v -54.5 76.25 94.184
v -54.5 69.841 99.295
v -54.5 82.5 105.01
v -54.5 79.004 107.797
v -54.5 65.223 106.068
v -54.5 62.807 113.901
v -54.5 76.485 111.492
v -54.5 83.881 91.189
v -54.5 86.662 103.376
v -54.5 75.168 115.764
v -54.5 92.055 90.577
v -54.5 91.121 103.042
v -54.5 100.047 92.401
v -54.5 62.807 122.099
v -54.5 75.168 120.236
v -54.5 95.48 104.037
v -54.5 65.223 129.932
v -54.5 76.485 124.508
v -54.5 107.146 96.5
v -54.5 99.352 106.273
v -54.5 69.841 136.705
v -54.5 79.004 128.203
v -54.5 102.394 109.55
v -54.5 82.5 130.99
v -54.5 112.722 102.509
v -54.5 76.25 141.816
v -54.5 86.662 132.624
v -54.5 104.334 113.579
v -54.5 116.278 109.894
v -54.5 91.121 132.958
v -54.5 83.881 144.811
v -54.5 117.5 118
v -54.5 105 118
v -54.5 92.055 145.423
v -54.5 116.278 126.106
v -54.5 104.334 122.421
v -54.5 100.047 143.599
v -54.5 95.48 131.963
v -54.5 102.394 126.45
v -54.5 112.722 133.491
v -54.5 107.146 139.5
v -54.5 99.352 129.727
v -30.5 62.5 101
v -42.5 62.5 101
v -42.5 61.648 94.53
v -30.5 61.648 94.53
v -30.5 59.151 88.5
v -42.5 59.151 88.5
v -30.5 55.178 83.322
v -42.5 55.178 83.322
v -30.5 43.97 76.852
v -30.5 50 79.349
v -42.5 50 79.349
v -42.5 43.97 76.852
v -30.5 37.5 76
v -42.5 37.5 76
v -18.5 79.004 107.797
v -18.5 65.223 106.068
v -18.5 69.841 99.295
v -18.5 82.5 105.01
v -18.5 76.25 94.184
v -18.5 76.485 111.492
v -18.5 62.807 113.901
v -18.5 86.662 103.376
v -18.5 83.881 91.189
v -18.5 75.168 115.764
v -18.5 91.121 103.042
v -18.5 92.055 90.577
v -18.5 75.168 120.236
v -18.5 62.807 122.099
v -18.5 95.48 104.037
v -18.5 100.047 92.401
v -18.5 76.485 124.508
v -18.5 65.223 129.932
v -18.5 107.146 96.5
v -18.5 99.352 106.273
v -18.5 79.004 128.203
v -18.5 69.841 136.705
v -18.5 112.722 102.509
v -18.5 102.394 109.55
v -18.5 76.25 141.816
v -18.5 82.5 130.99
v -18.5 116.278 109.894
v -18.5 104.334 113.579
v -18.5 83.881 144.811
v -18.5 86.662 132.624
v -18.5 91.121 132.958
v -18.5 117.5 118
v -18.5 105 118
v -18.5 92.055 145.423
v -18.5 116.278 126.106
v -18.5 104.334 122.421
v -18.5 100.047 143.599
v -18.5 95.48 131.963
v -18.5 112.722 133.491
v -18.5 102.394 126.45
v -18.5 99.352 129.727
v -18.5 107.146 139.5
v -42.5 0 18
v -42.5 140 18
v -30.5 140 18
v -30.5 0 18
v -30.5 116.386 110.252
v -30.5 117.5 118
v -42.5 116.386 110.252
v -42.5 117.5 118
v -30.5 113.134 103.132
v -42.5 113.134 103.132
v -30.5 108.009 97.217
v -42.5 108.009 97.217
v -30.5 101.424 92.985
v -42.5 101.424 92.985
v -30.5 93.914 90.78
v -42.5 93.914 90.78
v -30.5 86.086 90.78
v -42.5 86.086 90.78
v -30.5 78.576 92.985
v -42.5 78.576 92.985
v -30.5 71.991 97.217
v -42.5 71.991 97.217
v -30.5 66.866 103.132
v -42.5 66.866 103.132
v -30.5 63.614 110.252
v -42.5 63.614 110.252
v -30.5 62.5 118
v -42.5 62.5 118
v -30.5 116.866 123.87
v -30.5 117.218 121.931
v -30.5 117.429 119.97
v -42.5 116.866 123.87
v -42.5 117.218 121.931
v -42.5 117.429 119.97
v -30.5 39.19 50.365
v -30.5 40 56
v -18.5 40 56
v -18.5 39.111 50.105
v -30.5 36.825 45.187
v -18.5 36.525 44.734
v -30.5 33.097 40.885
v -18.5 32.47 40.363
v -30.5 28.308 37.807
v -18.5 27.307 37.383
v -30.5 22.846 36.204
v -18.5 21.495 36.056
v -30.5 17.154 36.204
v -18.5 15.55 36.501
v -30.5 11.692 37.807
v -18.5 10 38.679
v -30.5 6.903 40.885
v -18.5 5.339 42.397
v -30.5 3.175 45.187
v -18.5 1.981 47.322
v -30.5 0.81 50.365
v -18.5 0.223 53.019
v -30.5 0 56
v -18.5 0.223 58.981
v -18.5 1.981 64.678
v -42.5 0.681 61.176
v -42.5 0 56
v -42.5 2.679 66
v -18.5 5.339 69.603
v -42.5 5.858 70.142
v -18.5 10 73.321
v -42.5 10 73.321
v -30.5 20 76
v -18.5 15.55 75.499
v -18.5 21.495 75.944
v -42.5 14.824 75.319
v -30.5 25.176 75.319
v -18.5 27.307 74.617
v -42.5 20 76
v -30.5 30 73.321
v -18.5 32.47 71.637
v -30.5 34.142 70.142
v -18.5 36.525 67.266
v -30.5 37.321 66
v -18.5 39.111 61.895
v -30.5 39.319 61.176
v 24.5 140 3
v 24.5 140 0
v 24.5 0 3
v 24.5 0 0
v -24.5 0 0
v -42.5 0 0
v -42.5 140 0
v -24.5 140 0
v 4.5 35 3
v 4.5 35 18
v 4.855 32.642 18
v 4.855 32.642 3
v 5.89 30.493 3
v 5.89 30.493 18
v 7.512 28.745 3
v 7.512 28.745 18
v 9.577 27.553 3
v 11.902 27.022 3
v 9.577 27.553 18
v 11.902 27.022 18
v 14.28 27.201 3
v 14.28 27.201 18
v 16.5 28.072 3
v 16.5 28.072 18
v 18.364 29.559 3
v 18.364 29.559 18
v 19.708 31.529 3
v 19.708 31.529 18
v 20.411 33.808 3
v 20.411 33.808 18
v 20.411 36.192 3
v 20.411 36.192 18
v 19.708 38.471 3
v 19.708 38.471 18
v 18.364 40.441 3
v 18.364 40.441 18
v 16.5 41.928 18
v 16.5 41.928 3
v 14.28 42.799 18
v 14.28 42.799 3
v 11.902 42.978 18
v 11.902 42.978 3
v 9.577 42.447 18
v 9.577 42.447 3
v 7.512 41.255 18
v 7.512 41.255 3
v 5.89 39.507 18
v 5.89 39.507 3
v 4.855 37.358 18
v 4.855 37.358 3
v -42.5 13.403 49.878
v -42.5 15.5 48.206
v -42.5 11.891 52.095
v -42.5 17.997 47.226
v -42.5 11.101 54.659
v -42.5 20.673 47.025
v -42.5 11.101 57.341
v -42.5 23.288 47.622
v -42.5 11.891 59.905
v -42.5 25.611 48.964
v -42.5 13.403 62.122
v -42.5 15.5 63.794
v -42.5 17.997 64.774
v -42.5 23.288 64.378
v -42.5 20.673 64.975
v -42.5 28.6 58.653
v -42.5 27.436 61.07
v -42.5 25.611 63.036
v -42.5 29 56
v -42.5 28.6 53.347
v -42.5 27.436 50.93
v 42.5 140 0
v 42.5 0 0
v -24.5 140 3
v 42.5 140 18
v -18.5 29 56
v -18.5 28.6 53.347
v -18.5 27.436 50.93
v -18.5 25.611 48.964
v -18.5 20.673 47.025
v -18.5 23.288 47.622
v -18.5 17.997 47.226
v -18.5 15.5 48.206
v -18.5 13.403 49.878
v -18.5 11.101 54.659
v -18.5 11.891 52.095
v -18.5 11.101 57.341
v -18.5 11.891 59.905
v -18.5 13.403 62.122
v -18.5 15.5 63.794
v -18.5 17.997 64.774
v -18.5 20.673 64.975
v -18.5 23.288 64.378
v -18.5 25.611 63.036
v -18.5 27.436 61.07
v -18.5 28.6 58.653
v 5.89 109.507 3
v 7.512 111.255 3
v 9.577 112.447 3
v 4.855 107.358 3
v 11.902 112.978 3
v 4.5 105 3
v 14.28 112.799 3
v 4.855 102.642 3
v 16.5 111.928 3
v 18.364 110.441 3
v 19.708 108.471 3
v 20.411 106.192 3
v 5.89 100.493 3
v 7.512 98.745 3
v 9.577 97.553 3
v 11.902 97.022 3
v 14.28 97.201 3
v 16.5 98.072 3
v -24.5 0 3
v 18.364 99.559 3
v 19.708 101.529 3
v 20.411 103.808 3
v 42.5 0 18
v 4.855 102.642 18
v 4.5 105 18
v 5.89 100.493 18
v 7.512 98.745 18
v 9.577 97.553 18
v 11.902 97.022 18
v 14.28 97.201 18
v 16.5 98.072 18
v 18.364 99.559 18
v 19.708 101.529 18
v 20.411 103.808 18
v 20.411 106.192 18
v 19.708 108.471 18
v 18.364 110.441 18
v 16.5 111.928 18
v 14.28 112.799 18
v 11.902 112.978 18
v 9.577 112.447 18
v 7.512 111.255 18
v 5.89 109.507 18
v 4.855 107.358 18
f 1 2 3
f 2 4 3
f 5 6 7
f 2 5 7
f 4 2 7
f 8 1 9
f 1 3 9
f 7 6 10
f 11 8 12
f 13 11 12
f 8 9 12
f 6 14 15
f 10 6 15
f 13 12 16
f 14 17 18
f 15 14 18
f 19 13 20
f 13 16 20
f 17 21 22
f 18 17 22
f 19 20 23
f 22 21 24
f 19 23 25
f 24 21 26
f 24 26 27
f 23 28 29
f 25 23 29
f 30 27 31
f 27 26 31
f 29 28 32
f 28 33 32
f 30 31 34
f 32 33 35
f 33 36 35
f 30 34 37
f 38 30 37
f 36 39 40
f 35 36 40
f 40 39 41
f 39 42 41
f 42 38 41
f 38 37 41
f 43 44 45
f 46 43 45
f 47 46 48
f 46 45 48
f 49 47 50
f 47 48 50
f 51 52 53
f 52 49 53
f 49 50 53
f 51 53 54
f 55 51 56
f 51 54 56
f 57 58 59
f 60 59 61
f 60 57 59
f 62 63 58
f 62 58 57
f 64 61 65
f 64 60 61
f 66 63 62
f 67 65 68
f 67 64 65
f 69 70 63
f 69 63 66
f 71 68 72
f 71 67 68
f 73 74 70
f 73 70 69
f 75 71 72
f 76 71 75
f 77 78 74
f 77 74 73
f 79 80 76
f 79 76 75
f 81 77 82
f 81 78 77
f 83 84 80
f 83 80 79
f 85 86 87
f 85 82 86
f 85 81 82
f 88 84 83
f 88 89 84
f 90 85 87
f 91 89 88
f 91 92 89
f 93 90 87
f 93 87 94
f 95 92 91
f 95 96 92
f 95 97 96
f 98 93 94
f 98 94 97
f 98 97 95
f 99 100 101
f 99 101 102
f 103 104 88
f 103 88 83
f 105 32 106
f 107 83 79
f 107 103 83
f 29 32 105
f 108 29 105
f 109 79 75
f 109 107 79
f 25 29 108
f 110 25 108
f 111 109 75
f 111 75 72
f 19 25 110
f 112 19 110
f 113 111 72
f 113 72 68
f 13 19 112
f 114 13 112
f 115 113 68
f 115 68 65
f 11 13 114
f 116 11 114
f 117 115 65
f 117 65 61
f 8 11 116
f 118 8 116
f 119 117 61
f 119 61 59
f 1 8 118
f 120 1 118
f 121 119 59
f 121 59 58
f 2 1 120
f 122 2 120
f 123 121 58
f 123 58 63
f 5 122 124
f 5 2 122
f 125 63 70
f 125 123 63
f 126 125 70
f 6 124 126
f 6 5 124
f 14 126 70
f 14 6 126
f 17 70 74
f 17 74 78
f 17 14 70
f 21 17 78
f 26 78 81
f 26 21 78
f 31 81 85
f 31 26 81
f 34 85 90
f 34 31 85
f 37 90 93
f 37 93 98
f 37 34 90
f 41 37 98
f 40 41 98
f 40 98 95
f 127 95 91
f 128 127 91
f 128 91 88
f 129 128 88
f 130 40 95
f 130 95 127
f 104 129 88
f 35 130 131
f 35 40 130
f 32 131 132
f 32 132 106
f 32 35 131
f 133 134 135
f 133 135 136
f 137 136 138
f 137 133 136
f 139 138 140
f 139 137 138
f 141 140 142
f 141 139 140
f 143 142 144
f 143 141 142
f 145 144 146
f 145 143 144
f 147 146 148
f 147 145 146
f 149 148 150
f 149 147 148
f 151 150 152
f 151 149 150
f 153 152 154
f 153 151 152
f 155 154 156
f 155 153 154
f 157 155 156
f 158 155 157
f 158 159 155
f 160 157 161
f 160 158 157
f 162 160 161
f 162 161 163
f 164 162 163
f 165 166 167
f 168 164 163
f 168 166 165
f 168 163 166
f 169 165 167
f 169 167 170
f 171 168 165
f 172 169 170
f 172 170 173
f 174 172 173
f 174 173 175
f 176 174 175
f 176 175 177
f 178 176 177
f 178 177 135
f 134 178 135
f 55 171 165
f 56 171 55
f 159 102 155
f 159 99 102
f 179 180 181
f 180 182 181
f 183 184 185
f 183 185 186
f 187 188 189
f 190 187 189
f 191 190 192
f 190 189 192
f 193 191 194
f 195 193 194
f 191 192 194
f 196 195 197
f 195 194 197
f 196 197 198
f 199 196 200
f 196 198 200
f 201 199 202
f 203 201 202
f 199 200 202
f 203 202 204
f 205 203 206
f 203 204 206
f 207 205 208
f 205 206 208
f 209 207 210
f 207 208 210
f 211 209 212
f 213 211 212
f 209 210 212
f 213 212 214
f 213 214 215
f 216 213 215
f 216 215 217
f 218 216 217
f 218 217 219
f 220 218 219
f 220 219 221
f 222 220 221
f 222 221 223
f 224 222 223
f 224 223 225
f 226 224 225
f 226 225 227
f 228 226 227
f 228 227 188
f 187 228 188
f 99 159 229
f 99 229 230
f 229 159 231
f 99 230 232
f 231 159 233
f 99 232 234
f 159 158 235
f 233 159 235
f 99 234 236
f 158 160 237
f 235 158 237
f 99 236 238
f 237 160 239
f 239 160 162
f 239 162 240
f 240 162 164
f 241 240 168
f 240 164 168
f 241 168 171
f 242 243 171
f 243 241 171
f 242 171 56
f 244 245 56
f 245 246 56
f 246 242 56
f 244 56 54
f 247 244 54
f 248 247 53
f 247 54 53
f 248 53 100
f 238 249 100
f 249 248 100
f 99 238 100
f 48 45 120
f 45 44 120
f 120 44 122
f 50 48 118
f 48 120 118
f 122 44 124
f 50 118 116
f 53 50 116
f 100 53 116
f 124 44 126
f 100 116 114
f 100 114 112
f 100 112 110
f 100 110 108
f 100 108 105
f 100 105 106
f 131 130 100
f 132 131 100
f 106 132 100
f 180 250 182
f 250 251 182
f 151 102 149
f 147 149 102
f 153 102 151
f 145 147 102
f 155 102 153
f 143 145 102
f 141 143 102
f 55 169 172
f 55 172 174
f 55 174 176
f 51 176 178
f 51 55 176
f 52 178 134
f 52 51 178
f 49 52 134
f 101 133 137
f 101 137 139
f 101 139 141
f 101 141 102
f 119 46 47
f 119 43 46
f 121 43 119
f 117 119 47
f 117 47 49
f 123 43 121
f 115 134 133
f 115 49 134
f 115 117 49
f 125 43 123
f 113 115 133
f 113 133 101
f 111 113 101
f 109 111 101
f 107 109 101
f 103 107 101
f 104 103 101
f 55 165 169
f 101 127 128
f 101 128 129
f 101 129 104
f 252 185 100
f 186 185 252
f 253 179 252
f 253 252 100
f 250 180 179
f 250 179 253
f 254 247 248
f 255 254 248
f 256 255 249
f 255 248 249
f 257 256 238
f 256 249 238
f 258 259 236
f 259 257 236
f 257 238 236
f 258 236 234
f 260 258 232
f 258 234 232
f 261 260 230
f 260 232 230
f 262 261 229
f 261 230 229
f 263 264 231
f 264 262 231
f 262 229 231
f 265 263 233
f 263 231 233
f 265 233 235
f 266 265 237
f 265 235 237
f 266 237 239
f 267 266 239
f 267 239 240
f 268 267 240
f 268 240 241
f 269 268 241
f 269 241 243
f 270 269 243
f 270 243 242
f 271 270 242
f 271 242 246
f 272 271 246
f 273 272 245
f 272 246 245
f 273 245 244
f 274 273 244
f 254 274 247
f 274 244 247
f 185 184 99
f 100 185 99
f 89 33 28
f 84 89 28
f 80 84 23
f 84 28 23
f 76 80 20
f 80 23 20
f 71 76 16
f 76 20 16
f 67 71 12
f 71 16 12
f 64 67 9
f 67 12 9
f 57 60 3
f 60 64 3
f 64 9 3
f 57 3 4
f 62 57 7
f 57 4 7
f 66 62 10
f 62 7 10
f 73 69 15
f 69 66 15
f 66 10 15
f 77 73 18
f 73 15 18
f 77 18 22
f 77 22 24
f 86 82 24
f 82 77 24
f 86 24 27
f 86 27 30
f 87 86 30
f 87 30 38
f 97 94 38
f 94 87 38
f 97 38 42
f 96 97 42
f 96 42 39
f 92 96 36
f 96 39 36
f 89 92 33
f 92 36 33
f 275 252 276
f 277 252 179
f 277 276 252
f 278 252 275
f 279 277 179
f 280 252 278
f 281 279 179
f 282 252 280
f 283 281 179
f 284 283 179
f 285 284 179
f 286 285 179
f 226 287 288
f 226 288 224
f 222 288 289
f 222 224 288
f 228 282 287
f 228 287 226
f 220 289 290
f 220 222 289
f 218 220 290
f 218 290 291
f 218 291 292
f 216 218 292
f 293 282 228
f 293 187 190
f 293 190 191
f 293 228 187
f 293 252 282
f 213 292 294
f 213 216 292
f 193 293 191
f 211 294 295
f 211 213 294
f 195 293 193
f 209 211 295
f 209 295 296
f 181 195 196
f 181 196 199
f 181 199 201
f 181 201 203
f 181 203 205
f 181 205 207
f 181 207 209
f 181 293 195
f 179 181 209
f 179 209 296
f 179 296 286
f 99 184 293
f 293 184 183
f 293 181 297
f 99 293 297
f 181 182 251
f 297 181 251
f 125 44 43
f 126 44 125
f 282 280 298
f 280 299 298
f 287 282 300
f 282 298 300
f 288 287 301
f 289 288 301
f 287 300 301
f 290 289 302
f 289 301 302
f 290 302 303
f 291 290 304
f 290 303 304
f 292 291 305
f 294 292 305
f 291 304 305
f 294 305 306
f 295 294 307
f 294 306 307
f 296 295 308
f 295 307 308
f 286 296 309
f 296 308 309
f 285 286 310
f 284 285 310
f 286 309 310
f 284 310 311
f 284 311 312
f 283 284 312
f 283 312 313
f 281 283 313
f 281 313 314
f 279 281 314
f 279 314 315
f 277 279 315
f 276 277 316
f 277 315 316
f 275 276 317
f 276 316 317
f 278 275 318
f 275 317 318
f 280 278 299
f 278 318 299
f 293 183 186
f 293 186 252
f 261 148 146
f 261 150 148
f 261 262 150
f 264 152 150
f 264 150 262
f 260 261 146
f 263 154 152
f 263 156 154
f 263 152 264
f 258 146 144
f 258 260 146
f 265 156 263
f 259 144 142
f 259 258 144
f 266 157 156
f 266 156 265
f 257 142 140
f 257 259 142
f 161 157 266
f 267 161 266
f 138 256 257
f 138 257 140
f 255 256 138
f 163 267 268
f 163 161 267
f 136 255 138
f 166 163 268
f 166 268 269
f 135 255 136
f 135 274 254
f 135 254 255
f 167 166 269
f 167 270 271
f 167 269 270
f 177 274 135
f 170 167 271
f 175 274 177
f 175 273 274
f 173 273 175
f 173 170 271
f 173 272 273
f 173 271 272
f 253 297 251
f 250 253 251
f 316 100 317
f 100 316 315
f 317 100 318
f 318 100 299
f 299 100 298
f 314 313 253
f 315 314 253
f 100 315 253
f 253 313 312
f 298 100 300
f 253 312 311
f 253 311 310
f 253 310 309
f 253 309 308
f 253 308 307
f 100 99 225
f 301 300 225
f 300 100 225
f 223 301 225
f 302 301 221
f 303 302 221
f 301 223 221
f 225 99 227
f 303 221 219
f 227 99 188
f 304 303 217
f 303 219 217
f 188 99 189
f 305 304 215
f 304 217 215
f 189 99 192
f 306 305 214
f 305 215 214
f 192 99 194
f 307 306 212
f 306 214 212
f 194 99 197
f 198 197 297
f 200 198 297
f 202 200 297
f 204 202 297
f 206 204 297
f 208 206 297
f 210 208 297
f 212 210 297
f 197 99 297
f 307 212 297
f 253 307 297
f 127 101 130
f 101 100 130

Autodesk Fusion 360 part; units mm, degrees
sketch "Sketch1" plane through (0, 0, 0) normal (0, 1, 0) x (1, 0, 0)
  line L0 (-42.5, -18) -> (42.5, -18)
  line L1 (42.5, -18) -> (42.5, 0)
  line L2 (-42.5, 0) -> (-42.5, -18)
  line L3 (-42.5, 0) -> (-24.5, 0)
  line L4 (42.5, 0) -> (24.5, 0)
  line L5 (24.5, 0) -> (24.5, -3)
  line L6 (-24.5, 0) -> (-24.5, -3)
  line L7 (-24.5, -3) -> (24.5, -3)
  line L8 (-42.5, 0) -> (-24.5, 0)
  line L9 (24.5, 0) -> (42.5, 0)
  dimension "d40" = 18
  dimension "d41" = 18
  dimension "d42" = 49
  dimension "d43" = 3
  dimension "d44" = 18
  dimension "d45" = 85
  dimension "d46" = 3
extrude "Extrude1" add sketch "Sketch1" along normal blind 140 makes body 1
sketch "Sketch2" plane through (0, 0, 18) normal (0, 0, 1) x (-1, 0, 0)
  line L0 (42.5, 0) -> (-42.5, 0)
  line L1 (-42.5, 0) -> (-42.5, -140)
  line L2 (-42.5, -140) -> (42.5, -140)
  line L3 (42.5, -140) -> (42.5, 0)
  line L4 (42.5, -140) -> (30.5, -140)
  line L5 (30.5, 0) -> (42.5, 0)
  line L6 (42.5, 0) -> (42.5, -140)
  circle A0 centre (-12.5, -35) radius 8
  circle A1 centre (-12.5, -105) radius 8
  line L7 (42.5, 0) -> (30.5, 0)
  line L8 (30.5, 0) -> (30.5, -140)
  line L9 (30.5, -140) -> (42.5, -140)
  line L10 (42.5, -140) -> (42.5, 0)
  dimension "d14" = 12
  dimension "d15" = 140
extrude "Extrude2" cut sketch "Sketch2" against normal blind 20 contours A0 | A1 bodies 1
sketch "Sketch3" plane through (0, 0, 0) normal (1, 0, 0) x (0, 1, 0)
  line L0 (140, 18) -> (0, 18)
  line L1 (0, 18) -> (0, 56)
  line L2 (0, 18) -> (20, 18)
  circle A0 centre (20, 56) radius 20
  line L3 (140, 18) -> (90, 18)
  circle A1 centre (90, 118) radius 15
  circle A2 centre (90, 118) radius 27.5
  line L4 (20, 76) -> (37.5, 76)
  line L5 (62.5, 101) -> (62.5, 118)
  arc A3 (37.5, 76) -> (62.5, 101) centre (37.5, 101) ccw
  line L6 (140, 18) -> (116.8661, 123.8705)
  circle A4 centre (20, 56) radius 9
  dimension "d20" = 140
  dimension "d22" = 20
  dimension "d23" = 38
  dimension "d24" = 40
  dimension "d25" = 50
  dimension "d29" = 25
  dimension "d30" = 18
extrude "Extrude4" add sketch "Sketch3" along normal blind 12 from surface at -42.5 separate body makes body 2
extrude "Extrude5" add sketch "Sketch3" along normal blind 24 from surface at -42.5 contours A0 bodies 2
extrude "Extrude6" add sketch "Sketch3" along normal mid plane 36 from surface at -36.5 contours A2 bodies 2
